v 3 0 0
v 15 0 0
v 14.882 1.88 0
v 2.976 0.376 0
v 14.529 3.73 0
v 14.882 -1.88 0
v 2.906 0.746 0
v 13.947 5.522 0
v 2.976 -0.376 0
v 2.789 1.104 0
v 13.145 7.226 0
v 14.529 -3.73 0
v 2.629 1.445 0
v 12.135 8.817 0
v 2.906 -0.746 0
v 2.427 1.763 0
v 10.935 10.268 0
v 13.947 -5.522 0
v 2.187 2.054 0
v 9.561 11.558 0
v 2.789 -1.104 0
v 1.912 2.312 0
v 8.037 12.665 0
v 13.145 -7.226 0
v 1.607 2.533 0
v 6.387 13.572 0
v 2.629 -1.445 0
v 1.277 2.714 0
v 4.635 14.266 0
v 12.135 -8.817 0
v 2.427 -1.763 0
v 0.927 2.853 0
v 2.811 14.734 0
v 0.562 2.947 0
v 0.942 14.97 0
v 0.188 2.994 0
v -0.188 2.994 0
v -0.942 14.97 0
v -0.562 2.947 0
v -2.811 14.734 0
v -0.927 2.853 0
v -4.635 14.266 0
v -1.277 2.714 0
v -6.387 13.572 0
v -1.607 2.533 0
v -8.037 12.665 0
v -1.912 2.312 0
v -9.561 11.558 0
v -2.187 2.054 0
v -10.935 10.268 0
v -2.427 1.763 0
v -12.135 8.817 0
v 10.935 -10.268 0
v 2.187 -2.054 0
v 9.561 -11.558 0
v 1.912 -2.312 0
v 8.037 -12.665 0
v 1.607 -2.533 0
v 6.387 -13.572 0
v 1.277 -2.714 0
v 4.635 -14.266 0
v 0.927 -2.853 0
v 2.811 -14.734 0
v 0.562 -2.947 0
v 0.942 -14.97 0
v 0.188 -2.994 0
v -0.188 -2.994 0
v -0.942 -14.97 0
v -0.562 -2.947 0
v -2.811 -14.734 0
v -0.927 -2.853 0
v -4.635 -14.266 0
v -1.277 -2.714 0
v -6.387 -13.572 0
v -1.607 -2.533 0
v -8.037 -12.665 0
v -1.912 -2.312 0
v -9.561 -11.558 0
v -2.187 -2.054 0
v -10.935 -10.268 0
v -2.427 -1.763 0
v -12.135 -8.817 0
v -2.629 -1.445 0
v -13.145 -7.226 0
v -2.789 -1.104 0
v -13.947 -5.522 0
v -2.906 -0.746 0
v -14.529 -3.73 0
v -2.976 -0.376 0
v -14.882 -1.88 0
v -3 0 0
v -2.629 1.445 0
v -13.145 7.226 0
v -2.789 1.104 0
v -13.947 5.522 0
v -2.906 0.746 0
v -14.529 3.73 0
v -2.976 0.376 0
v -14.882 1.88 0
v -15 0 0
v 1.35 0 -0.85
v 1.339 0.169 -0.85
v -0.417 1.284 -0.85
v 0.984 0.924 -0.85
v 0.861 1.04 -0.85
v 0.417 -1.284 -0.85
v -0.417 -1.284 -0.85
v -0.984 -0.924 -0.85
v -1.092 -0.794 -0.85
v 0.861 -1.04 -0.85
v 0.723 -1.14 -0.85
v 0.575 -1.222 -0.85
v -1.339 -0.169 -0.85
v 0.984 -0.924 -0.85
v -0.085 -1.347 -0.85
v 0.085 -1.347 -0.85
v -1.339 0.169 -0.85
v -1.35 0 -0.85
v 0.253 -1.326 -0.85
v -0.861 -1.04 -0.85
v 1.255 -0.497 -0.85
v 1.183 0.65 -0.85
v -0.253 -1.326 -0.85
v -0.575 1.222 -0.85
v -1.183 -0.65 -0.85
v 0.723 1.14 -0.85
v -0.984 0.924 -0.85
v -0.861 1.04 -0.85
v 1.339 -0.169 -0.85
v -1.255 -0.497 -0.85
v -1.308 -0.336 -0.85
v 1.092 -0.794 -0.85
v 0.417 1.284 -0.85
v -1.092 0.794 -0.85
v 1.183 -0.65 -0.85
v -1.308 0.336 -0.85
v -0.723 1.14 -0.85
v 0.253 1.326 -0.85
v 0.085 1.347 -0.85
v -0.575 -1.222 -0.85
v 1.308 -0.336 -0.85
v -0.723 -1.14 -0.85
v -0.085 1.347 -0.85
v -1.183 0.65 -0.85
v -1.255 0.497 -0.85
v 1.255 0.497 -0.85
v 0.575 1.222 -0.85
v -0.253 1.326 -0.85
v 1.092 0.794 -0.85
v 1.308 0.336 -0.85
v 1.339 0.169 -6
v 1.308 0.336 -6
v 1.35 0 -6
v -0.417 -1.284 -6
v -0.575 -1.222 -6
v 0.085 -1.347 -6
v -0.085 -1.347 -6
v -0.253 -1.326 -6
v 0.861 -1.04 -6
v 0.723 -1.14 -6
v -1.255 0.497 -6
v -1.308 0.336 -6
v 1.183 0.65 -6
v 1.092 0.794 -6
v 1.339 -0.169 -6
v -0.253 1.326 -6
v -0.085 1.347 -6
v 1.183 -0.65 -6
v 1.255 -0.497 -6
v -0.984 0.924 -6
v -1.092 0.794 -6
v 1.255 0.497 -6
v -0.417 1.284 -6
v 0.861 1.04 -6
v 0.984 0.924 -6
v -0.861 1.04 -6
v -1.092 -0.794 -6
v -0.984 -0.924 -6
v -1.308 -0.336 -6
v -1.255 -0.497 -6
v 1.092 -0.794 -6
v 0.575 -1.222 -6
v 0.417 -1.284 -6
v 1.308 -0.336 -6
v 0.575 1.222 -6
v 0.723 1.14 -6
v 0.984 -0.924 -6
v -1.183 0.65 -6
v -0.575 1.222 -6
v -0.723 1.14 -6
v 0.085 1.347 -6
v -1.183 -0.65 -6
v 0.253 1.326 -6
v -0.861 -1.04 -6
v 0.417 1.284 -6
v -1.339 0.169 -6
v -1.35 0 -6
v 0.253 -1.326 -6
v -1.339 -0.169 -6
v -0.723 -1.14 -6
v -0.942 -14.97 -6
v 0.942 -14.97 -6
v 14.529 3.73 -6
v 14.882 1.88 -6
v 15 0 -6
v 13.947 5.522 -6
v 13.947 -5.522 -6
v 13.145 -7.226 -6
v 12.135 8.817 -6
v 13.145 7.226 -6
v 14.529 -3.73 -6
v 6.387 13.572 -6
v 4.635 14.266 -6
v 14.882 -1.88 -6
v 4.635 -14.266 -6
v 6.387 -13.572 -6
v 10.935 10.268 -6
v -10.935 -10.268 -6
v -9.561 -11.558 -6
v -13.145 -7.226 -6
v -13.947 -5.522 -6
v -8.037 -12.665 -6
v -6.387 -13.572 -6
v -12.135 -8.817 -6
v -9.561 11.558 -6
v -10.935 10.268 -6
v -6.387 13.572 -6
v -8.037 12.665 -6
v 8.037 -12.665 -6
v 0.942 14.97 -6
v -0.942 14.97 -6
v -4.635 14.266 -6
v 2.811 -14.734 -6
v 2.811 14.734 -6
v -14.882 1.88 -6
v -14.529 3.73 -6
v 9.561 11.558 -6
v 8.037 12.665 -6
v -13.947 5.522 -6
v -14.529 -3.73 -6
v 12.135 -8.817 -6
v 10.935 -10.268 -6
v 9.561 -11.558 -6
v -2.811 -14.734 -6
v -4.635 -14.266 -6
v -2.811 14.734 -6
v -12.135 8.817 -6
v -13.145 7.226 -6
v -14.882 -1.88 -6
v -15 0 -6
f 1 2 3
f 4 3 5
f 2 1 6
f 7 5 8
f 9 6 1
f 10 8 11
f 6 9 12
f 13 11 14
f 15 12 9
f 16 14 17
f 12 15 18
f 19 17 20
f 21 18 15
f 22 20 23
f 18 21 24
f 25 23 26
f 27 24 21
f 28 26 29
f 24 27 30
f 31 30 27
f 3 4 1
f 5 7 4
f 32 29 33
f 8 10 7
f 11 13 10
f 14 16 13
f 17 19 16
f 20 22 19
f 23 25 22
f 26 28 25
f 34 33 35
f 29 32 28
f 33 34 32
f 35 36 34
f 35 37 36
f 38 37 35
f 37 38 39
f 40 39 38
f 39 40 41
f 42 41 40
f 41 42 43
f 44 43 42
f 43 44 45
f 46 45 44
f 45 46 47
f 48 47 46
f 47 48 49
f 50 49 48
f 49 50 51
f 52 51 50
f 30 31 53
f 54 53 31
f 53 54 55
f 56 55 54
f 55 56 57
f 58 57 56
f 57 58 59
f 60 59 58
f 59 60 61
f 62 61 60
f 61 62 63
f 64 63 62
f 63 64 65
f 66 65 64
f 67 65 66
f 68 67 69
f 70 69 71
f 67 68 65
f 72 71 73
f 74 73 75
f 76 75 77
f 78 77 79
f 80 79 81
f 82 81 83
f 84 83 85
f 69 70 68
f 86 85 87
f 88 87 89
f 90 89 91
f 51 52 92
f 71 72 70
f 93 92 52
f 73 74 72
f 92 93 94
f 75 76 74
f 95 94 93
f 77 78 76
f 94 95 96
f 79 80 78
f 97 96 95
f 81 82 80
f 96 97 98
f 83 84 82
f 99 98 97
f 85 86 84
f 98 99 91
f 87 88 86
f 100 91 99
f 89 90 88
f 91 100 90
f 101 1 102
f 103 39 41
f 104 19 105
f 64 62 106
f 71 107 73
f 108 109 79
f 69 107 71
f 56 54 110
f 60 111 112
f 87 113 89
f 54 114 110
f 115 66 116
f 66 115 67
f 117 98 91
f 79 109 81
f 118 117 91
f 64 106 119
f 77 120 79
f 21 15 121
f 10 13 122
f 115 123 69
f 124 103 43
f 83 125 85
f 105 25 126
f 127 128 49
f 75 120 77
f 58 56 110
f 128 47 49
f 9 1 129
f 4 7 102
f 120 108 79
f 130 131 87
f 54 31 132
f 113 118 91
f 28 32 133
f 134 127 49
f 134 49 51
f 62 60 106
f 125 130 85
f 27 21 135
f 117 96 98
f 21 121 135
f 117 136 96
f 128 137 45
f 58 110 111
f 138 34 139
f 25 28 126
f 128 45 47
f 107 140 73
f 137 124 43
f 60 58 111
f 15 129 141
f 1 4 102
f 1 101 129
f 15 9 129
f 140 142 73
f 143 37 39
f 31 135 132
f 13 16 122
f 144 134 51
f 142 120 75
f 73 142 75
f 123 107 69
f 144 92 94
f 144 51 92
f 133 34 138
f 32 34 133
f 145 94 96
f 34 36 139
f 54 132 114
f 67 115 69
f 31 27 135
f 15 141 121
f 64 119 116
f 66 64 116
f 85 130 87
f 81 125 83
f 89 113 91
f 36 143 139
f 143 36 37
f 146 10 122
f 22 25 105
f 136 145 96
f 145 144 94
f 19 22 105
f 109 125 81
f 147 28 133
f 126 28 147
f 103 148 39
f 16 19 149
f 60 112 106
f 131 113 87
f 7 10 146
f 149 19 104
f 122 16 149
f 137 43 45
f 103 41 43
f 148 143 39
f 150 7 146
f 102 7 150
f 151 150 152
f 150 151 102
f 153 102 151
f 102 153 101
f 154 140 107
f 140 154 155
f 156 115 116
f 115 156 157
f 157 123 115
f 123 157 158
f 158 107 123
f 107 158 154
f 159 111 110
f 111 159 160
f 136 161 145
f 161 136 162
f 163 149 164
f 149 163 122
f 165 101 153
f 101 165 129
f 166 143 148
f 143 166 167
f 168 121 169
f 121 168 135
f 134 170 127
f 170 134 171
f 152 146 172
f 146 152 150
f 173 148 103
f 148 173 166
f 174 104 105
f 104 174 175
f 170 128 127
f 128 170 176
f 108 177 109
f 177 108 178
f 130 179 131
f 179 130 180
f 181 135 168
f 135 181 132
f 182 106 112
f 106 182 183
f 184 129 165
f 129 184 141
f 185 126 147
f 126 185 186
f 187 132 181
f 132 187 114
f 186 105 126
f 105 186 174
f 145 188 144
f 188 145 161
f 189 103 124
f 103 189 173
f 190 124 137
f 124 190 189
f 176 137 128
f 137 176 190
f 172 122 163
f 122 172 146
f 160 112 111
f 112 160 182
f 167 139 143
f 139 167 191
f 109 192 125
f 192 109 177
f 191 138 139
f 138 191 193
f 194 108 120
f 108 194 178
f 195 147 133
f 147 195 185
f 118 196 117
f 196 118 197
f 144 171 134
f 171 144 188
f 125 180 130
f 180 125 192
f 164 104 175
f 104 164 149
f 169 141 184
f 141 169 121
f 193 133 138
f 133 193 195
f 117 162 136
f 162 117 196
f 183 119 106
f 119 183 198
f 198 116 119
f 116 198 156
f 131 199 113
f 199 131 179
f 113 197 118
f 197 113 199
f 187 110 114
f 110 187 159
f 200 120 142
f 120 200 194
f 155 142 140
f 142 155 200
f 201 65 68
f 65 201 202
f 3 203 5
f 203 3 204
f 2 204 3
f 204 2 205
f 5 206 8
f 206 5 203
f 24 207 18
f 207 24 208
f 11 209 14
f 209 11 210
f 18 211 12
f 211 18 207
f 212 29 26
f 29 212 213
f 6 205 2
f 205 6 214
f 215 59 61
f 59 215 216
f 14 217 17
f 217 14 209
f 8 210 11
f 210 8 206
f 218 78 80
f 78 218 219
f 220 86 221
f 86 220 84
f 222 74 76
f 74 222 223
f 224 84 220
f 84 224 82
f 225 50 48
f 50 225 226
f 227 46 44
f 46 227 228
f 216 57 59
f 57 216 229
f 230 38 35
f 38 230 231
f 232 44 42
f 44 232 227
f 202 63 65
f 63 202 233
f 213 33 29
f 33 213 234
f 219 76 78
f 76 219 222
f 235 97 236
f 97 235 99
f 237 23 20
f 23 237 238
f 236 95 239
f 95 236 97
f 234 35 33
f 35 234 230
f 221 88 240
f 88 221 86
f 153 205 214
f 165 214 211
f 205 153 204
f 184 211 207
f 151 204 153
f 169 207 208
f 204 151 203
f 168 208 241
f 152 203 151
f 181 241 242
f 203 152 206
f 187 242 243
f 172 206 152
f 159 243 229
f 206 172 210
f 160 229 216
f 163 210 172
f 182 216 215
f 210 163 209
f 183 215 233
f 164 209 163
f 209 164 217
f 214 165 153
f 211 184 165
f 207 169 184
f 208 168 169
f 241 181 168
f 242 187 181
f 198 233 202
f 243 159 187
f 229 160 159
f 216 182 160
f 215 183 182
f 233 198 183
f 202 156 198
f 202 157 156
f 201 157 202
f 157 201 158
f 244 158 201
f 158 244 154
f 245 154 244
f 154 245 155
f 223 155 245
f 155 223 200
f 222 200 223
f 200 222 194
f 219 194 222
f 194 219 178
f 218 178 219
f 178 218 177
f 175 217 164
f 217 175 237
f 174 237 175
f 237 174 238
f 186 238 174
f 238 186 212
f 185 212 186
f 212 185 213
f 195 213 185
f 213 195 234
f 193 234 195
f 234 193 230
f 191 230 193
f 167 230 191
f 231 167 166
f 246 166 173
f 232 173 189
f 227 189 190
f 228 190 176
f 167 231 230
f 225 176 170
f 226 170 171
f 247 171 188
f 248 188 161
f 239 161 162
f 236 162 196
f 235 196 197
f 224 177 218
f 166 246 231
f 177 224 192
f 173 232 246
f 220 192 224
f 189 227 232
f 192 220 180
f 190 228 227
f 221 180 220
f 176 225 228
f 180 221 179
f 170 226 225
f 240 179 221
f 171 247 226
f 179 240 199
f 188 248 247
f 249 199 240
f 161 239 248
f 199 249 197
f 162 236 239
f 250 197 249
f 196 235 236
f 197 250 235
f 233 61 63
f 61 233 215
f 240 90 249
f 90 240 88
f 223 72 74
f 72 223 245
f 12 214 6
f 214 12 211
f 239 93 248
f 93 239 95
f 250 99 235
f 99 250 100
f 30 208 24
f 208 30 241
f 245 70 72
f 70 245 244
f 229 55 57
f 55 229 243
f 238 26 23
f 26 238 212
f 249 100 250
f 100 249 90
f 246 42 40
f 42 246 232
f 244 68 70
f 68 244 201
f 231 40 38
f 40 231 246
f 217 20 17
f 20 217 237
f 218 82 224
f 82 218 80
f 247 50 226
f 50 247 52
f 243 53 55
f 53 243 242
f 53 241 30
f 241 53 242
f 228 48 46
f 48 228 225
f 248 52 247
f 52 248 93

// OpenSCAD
$fn = 50;

difference() {
	union() {
		translate(v = [0, 0, -6.0]) {
			cylinder(h = 6, r = 15.0);
		}
	}
	union() {
		translate(v = [0, 0, 0]) {
			rotate(a = [0, 0, 0]) {
				difference() {
					union() {
						translate(v = [0, 0, -9.0]) {
							cylinder(h = 9, r = 1.0);
						}
						translate(v = [0, 0, -0.85]) {
							cylinder(h = 0.85, r1 = 1.35, r2 = 3.0);
						}
						translate(v = [0, 0, -9.0]) {
							cylinder(h = 9, r = 1.35);
						}
						translate(v = [0, 0, -9.0]) {
							cylinder(h = 9, r = 1.0);
						}
					}
					union();
				}
			}
		}
	}
}
